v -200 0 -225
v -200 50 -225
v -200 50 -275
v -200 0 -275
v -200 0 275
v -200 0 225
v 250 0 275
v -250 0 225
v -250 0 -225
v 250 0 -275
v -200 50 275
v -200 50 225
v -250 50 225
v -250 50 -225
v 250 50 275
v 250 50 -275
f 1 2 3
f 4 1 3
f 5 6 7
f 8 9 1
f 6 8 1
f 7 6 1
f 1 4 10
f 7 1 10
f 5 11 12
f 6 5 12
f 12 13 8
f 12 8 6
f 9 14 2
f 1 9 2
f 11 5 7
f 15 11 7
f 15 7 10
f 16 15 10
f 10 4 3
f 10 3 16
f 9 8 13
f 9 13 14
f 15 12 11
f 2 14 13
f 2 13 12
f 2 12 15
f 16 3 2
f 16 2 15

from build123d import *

# Parameters (mm, degrees)
CROQUIS1_W              = 500
CROQUIS1_H              = 550
SALIENTE_EXTRUIR1_DEPTH = 50
CROQUIS2_W              = 50
CROQUIS2_H              = 50
CORTAR_EXTRUIR1_DEPTH   = 50
MATRIZL1_COUNT          = 2
MATRIZL1_PITCH          = 500


with BuildPart() as part:
    # Croquis1 → Saliente-Extruir1 (new body)
    with BuildSketch(Plane(origin=(0, 0, 0), x_dir=(1, 0, 0), z_dir=(0, 1, 0))):
        Rectangle(CROQUIS1_W, CROQUIS1_H)
    extrude(amount=SALIENTE_EXTRUIR1_DEPTH)

    # Croquis2 → Cortar-Extruir1 (cut)
    with BuildSketch(Plane(origin=(0, 50, 0), x_dir=(1, 0, 0), z_dir=(0, 1, 0))):
        with Locations((-225, 250)):
            Rectangle(CROQUIS2_W, CROQUIS2_H)
    cortar_extruir1 = extrude(amount=-CORTAR_EXTRUIR1_DEPTH, mode=Mode.SUBTRACT)

    # MatrizL1: Cortar-Extruir1 ×2
    with Locations(*[(0, 0, i * MATRIZL1_PITCH) for i in range(1, MATRIZL1_COUNT)]):
        add(cortar_extruir1, mode=Mode.SUBTRACT)


solid = part.part
